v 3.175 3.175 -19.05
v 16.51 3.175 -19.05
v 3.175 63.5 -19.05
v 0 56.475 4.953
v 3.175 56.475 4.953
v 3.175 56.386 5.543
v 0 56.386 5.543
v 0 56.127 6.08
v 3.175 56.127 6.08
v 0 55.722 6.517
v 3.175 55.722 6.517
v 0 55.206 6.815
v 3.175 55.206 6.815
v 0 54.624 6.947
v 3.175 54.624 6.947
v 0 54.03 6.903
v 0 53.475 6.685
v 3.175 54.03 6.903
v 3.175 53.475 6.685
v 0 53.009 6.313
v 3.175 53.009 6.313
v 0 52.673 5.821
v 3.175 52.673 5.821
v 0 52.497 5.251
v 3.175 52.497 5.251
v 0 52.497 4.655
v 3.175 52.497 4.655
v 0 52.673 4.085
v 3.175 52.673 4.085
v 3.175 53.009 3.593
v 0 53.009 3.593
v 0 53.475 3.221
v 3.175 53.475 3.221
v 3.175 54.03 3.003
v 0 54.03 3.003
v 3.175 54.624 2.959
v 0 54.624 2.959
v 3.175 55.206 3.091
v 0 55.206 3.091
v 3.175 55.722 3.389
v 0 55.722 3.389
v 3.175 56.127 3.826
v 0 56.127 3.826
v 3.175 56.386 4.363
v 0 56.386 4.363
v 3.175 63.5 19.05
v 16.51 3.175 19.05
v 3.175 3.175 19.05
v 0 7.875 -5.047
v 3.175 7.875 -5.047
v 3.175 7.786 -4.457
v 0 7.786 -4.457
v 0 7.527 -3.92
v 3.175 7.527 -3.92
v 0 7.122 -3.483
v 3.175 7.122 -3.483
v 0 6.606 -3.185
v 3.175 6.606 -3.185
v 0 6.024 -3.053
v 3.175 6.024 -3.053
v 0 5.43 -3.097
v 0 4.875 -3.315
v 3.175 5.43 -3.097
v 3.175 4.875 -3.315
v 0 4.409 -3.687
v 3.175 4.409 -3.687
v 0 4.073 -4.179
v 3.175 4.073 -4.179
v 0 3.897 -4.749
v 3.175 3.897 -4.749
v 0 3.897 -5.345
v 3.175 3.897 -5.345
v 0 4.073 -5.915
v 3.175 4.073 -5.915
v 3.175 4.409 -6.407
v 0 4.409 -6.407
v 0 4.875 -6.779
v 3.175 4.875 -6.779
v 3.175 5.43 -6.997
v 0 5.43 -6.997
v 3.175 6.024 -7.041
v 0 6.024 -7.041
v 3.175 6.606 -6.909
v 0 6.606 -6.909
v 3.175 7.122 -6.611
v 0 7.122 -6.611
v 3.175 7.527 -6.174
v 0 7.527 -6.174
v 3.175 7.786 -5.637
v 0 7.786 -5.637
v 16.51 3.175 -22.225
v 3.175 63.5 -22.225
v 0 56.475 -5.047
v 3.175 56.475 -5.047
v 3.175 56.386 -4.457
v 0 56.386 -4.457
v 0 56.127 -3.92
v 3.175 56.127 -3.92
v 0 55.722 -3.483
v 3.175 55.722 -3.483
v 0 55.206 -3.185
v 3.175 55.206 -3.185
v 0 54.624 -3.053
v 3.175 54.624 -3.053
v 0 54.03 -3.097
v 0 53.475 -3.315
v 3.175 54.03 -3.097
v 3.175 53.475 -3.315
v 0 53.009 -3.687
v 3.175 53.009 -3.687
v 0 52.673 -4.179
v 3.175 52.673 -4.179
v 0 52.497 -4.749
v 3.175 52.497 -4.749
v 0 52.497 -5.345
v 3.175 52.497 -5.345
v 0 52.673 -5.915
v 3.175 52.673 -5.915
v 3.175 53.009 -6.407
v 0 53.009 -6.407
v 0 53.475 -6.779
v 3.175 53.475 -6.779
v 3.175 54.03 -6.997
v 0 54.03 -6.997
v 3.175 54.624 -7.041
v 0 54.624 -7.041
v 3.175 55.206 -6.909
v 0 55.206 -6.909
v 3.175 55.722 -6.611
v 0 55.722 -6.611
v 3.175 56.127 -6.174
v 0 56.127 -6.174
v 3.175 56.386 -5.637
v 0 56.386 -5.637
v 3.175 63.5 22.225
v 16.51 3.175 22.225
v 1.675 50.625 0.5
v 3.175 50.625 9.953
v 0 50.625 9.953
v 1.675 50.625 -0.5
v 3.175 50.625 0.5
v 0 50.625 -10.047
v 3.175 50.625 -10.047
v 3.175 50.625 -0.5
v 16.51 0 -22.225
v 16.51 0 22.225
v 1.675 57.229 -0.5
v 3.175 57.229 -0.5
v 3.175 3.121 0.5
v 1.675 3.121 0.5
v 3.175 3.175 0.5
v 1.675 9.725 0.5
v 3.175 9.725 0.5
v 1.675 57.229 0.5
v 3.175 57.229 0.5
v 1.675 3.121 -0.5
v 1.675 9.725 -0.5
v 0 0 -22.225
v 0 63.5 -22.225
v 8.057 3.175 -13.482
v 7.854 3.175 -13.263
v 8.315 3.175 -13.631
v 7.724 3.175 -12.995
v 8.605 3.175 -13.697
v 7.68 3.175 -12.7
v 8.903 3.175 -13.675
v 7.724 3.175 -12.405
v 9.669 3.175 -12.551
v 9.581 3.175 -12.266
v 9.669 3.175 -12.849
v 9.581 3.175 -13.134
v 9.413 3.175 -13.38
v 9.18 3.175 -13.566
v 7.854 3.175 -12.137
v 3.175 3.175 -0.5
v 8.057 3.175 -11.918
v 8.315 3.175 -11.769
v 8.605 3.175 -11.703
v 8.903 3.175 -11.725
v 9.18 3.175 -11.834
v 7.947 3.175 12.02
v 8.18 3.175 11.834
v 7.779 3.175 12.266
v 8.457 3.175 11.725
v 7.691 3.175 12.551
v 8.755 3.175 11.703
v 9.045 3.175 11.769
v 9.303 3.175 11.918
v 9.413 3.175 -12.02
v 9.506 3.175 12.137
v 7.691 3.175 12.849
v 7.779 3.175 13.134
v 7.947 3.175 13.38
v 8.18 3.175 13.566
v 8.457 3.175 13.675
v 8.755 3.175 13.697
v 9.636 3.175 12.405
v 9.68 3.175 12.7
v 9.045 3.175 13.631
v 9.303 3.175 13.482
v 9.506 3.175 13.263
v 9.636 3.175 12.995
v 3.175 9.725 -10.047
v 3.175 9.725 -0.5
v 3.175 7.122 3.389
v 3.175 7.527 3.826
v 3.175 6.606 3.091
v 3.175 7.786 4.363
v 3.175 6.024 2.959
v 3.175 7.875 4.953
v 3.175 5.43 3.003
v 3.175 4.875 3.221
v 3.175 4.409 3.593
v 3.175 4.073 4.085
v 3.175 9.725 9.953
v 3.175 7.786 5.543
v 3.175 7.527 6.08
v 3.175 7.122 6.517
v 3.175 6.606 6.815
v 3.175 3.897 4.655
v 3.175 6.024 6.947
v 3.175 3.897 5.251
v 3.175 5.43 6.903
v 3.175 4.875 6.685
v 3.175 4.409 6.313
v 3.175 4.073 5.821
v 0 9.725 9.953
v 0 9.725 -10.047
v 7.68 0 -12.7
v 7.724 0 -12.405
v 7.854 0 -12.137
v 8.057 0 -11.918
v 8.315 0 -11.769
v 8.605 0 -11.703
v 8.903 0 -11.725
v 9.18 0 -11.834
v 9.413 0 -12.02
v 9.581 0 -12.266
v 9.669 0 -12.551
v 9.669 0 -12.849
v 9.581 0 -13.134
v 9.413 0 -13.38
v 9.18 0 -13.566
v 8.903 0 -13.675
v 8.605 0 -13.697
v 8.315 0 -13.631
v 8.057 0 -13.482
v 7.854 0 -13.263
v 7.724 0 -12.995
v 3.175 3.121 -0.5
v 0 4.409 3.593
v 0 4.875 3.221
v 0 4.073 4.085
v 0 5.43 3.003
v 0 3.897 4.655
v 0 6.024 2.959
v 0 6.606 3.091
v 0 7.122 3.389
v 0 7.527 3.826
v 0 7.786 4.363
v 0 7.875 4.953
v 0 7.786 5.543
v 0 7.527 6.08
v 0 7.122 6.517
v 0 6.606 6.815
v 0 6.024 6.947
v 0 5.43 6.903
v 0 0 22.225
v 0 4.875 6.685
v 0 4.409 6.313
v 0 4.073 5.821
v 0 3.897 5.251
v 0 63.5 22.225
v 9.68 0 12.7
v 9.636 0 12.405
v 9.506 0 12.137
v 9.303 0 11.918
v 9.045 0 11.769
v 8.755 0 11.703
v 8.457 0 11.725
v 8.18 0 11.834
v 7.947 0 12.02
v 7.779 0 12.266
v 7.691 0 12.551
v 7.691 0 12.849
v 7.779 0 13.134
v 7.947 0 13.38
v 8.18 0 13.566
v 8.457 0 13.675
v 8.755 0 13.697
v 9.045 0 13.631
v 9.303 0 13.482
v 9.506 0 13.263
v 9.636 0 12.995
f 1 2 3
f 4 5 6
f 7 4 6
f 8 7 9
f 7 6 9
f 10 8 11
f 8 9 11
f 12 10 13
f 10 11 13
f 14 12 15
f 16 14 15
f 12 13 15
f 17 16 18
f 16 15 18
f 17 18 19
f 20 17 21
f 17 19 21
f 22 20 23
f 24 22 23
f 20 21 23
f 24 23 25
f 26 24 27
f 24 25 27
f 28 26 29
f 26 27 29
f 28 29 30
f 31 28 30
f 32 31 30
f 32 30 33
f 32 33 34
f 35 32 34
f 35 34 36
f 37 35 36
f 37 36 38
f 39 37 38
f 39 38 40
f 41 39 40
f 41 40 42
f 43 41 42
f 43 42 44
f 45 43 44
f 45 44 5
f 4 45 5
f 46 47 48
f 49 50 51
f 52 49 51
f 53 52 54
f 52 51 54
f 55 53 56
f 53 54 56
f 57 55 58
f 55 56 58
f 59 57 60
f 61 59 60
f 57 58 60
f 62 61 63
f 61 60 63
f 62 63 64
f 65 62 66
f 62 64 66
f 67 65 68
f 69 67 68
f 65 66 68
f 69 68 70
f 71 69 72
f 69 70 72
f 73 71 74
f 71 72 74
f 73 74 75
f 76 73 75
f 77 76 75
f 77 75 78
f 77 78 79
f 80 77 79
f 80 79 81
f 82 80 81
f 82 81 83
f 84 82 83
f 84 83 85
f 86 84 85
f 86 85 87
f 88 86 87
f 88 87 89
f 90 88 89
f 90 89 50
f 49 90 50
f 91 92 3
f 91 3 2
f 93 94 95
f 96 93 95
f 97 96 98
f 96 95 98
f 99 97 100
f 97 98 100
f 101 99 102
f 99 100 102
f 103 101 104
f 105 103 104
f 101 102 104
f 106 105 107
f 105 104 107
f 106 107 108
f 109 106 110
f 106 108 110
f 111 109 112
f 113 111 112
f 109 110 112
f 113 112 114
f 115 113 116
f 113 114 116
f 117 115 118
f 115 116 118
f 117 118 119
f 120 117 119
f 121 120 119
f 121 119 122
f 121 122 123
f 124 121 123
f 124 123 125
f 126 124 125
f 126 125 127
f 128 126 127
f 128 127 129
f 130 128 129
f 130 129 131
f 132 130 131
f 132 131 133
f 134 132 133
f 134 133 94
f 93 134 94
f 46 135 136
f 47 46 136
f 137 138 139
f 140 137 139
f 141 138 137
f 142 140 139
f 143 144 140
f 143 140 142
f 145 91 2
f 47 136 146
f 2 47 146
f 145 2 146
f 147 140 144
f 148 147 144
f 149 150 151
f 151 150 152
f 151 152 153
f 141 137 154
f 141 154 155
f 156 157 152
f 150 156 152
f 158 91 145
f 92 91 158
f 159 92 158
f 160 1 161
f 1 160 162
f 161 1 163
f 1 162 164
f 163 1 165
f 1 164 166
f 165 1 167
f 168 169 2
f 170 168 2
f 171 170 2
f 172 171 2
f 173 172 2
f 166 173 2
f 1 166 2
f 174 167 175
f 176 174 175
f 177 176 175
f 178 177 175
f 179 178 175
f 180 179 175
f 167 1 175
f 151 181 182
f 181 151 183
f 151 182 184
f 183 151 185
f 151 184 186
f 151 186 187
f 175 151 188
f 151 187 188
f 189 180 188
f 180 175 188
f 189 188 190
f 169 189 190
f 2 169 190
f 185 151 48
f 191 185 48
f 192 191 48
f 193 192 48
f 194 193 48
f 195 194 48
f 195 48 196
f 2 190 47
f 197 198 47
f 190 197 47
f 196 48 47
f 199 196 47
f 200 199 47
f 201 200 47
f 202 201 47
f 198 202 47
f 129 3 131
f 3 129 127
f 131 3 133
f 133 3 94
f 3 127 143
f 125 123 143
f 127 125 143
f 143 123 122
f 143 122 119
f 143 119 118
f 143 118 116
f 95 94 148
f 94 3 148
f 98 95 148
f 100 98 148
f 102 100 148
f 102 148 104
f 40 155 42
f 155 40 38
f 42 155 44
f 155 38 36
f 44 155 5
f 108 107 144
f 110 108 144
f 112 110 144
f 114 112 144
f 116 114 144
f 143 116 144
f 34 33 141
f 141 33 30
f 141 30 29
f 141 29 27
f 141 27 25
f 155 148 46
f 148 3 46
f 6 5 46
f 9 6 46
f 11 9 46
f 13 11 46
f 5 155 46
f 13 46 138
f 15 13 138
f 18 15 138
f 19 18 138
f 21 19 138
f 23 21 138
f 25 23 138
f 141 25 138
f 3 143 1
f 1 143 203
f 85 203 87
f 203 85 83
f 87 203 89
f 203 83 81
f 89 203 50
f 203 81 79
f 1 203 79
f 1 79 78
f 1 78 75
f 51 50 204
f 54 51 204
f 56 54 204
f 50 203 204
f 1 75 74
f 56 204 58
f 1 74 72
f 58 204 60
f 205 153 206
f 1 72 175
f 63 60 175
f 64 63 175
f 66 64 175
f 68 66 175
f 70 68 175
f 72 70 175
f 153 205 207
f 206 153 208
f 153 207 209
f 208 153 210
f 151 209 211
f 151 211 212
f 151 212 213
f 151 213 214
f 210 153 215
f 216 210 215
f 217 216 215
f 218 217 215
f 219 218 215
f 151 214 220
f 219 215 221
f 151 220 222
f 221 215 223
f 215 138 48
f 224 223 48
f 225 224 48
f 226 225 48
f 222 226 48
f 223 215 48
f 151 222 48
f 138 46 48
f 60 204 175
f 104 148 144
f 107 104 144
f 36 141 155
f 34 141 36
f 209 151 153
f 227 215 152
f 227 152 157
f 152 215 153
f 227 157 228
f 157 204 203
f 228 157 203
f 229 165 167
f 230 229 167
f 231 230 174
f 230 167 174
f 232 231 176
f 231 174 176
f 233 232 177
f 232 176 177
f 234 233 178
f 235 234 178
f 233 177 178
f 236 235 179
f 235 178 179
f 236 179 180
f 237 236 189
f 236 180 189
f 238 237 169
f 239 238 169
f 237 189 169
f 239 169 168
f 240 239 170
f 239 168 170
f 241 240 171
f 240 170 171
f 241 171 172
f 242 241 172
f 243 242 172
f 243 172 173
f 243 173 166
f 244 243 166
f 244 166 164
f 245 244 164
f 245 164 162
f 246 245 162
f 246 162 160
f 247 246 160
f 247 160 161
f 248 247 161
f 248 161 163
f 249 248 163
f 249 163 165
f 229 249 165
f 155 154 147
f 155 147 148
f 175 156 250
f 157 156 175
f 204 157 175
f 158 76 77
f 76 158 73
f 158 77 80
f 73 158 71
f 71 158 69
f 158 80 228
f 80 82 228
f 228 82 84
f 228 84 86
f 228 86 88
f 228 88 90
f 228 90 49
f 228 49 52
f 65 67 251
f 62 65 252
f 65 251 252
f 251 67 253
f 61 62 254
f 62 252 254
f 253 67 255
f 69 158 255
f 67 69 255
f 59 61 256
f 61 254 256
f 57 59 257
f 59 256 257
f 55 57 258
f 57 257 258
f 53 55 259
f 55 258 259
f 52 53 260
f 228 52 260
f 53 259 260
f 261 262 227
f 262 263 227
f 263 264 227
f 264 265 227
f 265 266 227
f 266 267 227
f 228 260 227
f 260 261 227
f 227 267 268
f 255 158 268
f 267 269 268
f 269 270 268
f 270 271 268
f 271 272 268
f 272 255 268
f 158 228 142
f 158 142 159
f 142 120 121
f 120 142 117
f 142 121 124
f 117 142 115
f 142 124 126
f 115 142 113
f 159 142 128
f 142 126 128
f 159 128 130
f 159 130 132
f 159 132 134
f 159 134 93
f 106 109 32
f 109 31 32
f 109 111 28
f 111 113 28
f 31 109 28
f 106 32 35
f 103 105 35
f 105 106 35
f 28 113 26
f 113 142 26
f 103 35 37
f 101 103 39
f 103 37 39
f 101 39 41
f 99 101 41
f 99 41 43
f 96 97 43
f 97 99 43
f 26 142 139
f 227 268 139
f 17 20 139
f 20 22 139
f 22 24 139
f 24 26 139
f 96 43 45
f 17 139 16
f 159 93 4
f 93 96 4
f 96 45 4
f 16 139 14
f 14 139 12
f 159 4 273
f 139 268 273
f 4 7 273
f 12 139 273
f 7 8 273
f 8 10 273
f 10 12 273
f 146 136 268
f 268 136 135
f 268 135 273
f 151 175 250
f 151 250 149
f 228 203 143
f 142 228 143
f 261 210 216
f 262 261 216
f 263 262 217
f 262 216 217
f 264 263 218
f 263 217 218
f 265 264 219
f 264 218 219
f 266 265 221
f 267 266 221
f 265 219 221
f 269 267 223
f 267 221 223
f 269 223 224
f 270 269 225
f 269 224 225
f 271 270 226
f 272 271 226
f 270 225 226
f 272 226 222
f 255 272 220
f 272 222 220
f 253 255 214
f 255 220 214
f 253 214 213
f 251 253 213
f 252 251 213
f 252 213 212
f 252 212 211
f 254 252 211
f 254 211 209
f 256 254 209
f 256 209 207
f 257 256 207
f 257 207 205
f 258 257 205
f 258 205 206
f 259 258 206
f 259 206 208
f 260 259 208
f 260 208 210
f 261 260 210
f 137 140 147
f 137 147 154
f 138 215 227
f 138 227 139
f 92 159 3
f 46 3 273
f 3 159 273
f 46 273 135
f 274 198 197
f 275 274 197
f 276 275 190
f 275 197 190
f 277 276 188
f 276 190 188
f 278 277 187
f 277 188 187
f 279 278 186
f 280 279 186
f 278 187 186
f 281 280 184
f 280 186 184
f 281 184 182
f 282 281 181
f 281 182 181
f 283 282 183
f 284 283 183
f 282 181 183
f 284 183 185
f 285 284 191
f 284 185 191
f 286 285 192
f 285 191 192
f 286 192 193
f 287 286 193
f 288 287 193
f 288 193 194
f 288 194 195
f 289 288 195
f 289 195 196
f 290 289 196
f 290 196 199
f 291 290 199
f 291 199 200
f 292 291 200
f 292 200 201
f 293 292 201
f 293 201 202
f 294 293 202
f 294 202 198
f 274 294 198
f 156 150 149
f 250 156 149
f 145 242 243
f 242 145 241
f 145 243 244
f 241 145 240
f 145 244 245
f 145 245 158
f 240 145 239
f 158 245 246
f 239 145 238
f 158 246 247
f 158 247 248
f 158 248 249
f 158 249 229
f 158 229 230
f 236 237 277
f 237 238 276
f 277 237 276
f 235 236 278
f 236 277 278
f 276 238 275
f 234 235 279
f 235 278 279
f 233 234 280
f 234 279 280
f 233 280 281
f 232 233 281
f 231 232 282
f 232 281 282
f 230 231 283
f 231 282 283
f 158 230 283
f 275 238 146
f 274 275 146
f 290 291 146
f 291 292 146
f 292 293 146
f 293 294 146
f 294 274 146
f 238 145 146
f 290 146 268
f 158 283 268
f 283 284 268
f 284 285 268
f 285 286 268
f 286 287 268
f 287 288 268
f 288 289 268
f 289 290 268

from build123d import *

# Parameters (mm, degrees)
BOSS_EXTRUDE1_DEPTH = 22.225
BOSS_EXTRUDE2_DEPTH = 3.175
SKETCH4_R           = 1.000000032
CUT_EXTRUDE2_DEPTH  = 67.374967797
SKETCH5_R           = 2.000000064
CUT_EXTRUDE3_DEPTH  = 69.585879378
SKETCH6_W           = 19.999999878
SKETCH6_H           = 40.899999988
CUT_EXTRUDE4_DEPTH  = 69.585879378
SKETCH7_W           = 1.500000048
SKETCH7_H           = 1.000000032
CUT_EXTRUDE5_DEPTH  = 6.604
CUT_EXTRUDE6_START  = 40.9
SKETCH7_2_W         = 1.500000048
SKETCH7_2_H         = 1.000000032
CUT_EXTRUDE6_DEPTH  = 6.604


with BuildPart() as part:
    # Sketch1 → Boss-Extrude1 (new, symmetric)
    with BuildSketch(Plane.XY):
        Polygon((0, 0), (0, 63.5), (3.175, 63.5), (3.175, 3.175), (16.51, 3.175), (16.51, 0), align=None)
    extrude(amount=BOSS_EXTRUDE1_DEPTH, both=True)

    # Sketch3 → Boss-Extrude2 (add)
    with BuildSketch(Plane.XY.offset(22.225)):
        Polygon((3.175, 63.5), (16.51, 3.175), (3.175, 3.175), align=None)
    boss_extrude2 = extrude(amount=-BOSS_EXTRUDE2_DEPTH)

    # Mirror1: Boss-Extrude2 across plane
    add(boss_extrude2.mirror(Plane.XY))

    # Sketch4 → Cut-Extrude2 (cut, through all)
    with BuildSketch(Plane(origin=(0, 3.175, 0), x_dir=(1, 0, 0), z_dir=(0, 1, 0))):
        with Locations(Location((8.679999912, 12.7, 0), (0, 0, 180))):
            Circle(SKETCH4_R)
        with Locations((8.679999912, -12.7)):
            Circle(SKETCH4_R)
    extrude(amount=-CUT_EXTRUDE2_DEPTH, mode=Mode.SUBTRACT)

    # Sketch5 → Cut-Extrude3 (cut, through all)
    with BuildSketch(Plane(origin=(3.175, 0, 0), x_dir=(0, 0, -1), z_dir=(1, 0, 0))):
        with Locations(Location((-4.953, 5.874999934, 0), (0, 0, 90))):
            Circle(SKETCH5_R)
        with Locations(Location((5.047000066, 5.874999934, 0), (0, 0, 90))):
            Circle(SKETCH5_R)
        with Locations(Location((-4.953, 54.475000016, 0), (0, 0, 90))):
            Circle(SKETCH5_R)
        with Locations(Location((5.047000066, 54.475000016, 0), (0, 0, 90))):
            Circle(SKETCH5_R)
    extrude(amount=-CUT_EXTRUDE3_DEPTH, mode=Mode.SUBTRACT)

    # Sketch6 → Cut-Extrude4 (cut, through all)
    with BuildSketch(Plane(origin=(3.175, 0, 0), x_dir=(0, 0, -1), z_dir=(1, 0, 0))):
        with Locations((0.047000033, 30.174999975)):
            Rectangle(SKETCH6_W, SKETCH6_H)
    extrude(amount=-CUT_EXTRUDE4_DEPTH, mode=Mode.SUBTRACT)

    # Sketch7 → Cut-Extrude5 (cut)
    with BuildSketch(Plane.XZ.offset(-50.624999969)):
        with Locations((2.424999976, 0)):
            Rectangle(SKETCH7_W, SKETCH7_H)
    extrude(amount=-CUT_EXTRUDE5_DEPTH, mode=Mode.SUBTRACT)

    # Sketch7<2> → Cut-Extrude6 (cut)
    with BuildSketch(Plane.XZ.offset(-50.624999969).offset(CUT_EXTRUDE6_START)):
        with Locations((2.424999976, 0)):
            Rectangle(SKETCH7_2_W, SKETCH7_2_H)
    extrude(amount=CUT_EXTRUDE6_DEPTH, mode=Mode.SUBTRACT)


solid = part.part
